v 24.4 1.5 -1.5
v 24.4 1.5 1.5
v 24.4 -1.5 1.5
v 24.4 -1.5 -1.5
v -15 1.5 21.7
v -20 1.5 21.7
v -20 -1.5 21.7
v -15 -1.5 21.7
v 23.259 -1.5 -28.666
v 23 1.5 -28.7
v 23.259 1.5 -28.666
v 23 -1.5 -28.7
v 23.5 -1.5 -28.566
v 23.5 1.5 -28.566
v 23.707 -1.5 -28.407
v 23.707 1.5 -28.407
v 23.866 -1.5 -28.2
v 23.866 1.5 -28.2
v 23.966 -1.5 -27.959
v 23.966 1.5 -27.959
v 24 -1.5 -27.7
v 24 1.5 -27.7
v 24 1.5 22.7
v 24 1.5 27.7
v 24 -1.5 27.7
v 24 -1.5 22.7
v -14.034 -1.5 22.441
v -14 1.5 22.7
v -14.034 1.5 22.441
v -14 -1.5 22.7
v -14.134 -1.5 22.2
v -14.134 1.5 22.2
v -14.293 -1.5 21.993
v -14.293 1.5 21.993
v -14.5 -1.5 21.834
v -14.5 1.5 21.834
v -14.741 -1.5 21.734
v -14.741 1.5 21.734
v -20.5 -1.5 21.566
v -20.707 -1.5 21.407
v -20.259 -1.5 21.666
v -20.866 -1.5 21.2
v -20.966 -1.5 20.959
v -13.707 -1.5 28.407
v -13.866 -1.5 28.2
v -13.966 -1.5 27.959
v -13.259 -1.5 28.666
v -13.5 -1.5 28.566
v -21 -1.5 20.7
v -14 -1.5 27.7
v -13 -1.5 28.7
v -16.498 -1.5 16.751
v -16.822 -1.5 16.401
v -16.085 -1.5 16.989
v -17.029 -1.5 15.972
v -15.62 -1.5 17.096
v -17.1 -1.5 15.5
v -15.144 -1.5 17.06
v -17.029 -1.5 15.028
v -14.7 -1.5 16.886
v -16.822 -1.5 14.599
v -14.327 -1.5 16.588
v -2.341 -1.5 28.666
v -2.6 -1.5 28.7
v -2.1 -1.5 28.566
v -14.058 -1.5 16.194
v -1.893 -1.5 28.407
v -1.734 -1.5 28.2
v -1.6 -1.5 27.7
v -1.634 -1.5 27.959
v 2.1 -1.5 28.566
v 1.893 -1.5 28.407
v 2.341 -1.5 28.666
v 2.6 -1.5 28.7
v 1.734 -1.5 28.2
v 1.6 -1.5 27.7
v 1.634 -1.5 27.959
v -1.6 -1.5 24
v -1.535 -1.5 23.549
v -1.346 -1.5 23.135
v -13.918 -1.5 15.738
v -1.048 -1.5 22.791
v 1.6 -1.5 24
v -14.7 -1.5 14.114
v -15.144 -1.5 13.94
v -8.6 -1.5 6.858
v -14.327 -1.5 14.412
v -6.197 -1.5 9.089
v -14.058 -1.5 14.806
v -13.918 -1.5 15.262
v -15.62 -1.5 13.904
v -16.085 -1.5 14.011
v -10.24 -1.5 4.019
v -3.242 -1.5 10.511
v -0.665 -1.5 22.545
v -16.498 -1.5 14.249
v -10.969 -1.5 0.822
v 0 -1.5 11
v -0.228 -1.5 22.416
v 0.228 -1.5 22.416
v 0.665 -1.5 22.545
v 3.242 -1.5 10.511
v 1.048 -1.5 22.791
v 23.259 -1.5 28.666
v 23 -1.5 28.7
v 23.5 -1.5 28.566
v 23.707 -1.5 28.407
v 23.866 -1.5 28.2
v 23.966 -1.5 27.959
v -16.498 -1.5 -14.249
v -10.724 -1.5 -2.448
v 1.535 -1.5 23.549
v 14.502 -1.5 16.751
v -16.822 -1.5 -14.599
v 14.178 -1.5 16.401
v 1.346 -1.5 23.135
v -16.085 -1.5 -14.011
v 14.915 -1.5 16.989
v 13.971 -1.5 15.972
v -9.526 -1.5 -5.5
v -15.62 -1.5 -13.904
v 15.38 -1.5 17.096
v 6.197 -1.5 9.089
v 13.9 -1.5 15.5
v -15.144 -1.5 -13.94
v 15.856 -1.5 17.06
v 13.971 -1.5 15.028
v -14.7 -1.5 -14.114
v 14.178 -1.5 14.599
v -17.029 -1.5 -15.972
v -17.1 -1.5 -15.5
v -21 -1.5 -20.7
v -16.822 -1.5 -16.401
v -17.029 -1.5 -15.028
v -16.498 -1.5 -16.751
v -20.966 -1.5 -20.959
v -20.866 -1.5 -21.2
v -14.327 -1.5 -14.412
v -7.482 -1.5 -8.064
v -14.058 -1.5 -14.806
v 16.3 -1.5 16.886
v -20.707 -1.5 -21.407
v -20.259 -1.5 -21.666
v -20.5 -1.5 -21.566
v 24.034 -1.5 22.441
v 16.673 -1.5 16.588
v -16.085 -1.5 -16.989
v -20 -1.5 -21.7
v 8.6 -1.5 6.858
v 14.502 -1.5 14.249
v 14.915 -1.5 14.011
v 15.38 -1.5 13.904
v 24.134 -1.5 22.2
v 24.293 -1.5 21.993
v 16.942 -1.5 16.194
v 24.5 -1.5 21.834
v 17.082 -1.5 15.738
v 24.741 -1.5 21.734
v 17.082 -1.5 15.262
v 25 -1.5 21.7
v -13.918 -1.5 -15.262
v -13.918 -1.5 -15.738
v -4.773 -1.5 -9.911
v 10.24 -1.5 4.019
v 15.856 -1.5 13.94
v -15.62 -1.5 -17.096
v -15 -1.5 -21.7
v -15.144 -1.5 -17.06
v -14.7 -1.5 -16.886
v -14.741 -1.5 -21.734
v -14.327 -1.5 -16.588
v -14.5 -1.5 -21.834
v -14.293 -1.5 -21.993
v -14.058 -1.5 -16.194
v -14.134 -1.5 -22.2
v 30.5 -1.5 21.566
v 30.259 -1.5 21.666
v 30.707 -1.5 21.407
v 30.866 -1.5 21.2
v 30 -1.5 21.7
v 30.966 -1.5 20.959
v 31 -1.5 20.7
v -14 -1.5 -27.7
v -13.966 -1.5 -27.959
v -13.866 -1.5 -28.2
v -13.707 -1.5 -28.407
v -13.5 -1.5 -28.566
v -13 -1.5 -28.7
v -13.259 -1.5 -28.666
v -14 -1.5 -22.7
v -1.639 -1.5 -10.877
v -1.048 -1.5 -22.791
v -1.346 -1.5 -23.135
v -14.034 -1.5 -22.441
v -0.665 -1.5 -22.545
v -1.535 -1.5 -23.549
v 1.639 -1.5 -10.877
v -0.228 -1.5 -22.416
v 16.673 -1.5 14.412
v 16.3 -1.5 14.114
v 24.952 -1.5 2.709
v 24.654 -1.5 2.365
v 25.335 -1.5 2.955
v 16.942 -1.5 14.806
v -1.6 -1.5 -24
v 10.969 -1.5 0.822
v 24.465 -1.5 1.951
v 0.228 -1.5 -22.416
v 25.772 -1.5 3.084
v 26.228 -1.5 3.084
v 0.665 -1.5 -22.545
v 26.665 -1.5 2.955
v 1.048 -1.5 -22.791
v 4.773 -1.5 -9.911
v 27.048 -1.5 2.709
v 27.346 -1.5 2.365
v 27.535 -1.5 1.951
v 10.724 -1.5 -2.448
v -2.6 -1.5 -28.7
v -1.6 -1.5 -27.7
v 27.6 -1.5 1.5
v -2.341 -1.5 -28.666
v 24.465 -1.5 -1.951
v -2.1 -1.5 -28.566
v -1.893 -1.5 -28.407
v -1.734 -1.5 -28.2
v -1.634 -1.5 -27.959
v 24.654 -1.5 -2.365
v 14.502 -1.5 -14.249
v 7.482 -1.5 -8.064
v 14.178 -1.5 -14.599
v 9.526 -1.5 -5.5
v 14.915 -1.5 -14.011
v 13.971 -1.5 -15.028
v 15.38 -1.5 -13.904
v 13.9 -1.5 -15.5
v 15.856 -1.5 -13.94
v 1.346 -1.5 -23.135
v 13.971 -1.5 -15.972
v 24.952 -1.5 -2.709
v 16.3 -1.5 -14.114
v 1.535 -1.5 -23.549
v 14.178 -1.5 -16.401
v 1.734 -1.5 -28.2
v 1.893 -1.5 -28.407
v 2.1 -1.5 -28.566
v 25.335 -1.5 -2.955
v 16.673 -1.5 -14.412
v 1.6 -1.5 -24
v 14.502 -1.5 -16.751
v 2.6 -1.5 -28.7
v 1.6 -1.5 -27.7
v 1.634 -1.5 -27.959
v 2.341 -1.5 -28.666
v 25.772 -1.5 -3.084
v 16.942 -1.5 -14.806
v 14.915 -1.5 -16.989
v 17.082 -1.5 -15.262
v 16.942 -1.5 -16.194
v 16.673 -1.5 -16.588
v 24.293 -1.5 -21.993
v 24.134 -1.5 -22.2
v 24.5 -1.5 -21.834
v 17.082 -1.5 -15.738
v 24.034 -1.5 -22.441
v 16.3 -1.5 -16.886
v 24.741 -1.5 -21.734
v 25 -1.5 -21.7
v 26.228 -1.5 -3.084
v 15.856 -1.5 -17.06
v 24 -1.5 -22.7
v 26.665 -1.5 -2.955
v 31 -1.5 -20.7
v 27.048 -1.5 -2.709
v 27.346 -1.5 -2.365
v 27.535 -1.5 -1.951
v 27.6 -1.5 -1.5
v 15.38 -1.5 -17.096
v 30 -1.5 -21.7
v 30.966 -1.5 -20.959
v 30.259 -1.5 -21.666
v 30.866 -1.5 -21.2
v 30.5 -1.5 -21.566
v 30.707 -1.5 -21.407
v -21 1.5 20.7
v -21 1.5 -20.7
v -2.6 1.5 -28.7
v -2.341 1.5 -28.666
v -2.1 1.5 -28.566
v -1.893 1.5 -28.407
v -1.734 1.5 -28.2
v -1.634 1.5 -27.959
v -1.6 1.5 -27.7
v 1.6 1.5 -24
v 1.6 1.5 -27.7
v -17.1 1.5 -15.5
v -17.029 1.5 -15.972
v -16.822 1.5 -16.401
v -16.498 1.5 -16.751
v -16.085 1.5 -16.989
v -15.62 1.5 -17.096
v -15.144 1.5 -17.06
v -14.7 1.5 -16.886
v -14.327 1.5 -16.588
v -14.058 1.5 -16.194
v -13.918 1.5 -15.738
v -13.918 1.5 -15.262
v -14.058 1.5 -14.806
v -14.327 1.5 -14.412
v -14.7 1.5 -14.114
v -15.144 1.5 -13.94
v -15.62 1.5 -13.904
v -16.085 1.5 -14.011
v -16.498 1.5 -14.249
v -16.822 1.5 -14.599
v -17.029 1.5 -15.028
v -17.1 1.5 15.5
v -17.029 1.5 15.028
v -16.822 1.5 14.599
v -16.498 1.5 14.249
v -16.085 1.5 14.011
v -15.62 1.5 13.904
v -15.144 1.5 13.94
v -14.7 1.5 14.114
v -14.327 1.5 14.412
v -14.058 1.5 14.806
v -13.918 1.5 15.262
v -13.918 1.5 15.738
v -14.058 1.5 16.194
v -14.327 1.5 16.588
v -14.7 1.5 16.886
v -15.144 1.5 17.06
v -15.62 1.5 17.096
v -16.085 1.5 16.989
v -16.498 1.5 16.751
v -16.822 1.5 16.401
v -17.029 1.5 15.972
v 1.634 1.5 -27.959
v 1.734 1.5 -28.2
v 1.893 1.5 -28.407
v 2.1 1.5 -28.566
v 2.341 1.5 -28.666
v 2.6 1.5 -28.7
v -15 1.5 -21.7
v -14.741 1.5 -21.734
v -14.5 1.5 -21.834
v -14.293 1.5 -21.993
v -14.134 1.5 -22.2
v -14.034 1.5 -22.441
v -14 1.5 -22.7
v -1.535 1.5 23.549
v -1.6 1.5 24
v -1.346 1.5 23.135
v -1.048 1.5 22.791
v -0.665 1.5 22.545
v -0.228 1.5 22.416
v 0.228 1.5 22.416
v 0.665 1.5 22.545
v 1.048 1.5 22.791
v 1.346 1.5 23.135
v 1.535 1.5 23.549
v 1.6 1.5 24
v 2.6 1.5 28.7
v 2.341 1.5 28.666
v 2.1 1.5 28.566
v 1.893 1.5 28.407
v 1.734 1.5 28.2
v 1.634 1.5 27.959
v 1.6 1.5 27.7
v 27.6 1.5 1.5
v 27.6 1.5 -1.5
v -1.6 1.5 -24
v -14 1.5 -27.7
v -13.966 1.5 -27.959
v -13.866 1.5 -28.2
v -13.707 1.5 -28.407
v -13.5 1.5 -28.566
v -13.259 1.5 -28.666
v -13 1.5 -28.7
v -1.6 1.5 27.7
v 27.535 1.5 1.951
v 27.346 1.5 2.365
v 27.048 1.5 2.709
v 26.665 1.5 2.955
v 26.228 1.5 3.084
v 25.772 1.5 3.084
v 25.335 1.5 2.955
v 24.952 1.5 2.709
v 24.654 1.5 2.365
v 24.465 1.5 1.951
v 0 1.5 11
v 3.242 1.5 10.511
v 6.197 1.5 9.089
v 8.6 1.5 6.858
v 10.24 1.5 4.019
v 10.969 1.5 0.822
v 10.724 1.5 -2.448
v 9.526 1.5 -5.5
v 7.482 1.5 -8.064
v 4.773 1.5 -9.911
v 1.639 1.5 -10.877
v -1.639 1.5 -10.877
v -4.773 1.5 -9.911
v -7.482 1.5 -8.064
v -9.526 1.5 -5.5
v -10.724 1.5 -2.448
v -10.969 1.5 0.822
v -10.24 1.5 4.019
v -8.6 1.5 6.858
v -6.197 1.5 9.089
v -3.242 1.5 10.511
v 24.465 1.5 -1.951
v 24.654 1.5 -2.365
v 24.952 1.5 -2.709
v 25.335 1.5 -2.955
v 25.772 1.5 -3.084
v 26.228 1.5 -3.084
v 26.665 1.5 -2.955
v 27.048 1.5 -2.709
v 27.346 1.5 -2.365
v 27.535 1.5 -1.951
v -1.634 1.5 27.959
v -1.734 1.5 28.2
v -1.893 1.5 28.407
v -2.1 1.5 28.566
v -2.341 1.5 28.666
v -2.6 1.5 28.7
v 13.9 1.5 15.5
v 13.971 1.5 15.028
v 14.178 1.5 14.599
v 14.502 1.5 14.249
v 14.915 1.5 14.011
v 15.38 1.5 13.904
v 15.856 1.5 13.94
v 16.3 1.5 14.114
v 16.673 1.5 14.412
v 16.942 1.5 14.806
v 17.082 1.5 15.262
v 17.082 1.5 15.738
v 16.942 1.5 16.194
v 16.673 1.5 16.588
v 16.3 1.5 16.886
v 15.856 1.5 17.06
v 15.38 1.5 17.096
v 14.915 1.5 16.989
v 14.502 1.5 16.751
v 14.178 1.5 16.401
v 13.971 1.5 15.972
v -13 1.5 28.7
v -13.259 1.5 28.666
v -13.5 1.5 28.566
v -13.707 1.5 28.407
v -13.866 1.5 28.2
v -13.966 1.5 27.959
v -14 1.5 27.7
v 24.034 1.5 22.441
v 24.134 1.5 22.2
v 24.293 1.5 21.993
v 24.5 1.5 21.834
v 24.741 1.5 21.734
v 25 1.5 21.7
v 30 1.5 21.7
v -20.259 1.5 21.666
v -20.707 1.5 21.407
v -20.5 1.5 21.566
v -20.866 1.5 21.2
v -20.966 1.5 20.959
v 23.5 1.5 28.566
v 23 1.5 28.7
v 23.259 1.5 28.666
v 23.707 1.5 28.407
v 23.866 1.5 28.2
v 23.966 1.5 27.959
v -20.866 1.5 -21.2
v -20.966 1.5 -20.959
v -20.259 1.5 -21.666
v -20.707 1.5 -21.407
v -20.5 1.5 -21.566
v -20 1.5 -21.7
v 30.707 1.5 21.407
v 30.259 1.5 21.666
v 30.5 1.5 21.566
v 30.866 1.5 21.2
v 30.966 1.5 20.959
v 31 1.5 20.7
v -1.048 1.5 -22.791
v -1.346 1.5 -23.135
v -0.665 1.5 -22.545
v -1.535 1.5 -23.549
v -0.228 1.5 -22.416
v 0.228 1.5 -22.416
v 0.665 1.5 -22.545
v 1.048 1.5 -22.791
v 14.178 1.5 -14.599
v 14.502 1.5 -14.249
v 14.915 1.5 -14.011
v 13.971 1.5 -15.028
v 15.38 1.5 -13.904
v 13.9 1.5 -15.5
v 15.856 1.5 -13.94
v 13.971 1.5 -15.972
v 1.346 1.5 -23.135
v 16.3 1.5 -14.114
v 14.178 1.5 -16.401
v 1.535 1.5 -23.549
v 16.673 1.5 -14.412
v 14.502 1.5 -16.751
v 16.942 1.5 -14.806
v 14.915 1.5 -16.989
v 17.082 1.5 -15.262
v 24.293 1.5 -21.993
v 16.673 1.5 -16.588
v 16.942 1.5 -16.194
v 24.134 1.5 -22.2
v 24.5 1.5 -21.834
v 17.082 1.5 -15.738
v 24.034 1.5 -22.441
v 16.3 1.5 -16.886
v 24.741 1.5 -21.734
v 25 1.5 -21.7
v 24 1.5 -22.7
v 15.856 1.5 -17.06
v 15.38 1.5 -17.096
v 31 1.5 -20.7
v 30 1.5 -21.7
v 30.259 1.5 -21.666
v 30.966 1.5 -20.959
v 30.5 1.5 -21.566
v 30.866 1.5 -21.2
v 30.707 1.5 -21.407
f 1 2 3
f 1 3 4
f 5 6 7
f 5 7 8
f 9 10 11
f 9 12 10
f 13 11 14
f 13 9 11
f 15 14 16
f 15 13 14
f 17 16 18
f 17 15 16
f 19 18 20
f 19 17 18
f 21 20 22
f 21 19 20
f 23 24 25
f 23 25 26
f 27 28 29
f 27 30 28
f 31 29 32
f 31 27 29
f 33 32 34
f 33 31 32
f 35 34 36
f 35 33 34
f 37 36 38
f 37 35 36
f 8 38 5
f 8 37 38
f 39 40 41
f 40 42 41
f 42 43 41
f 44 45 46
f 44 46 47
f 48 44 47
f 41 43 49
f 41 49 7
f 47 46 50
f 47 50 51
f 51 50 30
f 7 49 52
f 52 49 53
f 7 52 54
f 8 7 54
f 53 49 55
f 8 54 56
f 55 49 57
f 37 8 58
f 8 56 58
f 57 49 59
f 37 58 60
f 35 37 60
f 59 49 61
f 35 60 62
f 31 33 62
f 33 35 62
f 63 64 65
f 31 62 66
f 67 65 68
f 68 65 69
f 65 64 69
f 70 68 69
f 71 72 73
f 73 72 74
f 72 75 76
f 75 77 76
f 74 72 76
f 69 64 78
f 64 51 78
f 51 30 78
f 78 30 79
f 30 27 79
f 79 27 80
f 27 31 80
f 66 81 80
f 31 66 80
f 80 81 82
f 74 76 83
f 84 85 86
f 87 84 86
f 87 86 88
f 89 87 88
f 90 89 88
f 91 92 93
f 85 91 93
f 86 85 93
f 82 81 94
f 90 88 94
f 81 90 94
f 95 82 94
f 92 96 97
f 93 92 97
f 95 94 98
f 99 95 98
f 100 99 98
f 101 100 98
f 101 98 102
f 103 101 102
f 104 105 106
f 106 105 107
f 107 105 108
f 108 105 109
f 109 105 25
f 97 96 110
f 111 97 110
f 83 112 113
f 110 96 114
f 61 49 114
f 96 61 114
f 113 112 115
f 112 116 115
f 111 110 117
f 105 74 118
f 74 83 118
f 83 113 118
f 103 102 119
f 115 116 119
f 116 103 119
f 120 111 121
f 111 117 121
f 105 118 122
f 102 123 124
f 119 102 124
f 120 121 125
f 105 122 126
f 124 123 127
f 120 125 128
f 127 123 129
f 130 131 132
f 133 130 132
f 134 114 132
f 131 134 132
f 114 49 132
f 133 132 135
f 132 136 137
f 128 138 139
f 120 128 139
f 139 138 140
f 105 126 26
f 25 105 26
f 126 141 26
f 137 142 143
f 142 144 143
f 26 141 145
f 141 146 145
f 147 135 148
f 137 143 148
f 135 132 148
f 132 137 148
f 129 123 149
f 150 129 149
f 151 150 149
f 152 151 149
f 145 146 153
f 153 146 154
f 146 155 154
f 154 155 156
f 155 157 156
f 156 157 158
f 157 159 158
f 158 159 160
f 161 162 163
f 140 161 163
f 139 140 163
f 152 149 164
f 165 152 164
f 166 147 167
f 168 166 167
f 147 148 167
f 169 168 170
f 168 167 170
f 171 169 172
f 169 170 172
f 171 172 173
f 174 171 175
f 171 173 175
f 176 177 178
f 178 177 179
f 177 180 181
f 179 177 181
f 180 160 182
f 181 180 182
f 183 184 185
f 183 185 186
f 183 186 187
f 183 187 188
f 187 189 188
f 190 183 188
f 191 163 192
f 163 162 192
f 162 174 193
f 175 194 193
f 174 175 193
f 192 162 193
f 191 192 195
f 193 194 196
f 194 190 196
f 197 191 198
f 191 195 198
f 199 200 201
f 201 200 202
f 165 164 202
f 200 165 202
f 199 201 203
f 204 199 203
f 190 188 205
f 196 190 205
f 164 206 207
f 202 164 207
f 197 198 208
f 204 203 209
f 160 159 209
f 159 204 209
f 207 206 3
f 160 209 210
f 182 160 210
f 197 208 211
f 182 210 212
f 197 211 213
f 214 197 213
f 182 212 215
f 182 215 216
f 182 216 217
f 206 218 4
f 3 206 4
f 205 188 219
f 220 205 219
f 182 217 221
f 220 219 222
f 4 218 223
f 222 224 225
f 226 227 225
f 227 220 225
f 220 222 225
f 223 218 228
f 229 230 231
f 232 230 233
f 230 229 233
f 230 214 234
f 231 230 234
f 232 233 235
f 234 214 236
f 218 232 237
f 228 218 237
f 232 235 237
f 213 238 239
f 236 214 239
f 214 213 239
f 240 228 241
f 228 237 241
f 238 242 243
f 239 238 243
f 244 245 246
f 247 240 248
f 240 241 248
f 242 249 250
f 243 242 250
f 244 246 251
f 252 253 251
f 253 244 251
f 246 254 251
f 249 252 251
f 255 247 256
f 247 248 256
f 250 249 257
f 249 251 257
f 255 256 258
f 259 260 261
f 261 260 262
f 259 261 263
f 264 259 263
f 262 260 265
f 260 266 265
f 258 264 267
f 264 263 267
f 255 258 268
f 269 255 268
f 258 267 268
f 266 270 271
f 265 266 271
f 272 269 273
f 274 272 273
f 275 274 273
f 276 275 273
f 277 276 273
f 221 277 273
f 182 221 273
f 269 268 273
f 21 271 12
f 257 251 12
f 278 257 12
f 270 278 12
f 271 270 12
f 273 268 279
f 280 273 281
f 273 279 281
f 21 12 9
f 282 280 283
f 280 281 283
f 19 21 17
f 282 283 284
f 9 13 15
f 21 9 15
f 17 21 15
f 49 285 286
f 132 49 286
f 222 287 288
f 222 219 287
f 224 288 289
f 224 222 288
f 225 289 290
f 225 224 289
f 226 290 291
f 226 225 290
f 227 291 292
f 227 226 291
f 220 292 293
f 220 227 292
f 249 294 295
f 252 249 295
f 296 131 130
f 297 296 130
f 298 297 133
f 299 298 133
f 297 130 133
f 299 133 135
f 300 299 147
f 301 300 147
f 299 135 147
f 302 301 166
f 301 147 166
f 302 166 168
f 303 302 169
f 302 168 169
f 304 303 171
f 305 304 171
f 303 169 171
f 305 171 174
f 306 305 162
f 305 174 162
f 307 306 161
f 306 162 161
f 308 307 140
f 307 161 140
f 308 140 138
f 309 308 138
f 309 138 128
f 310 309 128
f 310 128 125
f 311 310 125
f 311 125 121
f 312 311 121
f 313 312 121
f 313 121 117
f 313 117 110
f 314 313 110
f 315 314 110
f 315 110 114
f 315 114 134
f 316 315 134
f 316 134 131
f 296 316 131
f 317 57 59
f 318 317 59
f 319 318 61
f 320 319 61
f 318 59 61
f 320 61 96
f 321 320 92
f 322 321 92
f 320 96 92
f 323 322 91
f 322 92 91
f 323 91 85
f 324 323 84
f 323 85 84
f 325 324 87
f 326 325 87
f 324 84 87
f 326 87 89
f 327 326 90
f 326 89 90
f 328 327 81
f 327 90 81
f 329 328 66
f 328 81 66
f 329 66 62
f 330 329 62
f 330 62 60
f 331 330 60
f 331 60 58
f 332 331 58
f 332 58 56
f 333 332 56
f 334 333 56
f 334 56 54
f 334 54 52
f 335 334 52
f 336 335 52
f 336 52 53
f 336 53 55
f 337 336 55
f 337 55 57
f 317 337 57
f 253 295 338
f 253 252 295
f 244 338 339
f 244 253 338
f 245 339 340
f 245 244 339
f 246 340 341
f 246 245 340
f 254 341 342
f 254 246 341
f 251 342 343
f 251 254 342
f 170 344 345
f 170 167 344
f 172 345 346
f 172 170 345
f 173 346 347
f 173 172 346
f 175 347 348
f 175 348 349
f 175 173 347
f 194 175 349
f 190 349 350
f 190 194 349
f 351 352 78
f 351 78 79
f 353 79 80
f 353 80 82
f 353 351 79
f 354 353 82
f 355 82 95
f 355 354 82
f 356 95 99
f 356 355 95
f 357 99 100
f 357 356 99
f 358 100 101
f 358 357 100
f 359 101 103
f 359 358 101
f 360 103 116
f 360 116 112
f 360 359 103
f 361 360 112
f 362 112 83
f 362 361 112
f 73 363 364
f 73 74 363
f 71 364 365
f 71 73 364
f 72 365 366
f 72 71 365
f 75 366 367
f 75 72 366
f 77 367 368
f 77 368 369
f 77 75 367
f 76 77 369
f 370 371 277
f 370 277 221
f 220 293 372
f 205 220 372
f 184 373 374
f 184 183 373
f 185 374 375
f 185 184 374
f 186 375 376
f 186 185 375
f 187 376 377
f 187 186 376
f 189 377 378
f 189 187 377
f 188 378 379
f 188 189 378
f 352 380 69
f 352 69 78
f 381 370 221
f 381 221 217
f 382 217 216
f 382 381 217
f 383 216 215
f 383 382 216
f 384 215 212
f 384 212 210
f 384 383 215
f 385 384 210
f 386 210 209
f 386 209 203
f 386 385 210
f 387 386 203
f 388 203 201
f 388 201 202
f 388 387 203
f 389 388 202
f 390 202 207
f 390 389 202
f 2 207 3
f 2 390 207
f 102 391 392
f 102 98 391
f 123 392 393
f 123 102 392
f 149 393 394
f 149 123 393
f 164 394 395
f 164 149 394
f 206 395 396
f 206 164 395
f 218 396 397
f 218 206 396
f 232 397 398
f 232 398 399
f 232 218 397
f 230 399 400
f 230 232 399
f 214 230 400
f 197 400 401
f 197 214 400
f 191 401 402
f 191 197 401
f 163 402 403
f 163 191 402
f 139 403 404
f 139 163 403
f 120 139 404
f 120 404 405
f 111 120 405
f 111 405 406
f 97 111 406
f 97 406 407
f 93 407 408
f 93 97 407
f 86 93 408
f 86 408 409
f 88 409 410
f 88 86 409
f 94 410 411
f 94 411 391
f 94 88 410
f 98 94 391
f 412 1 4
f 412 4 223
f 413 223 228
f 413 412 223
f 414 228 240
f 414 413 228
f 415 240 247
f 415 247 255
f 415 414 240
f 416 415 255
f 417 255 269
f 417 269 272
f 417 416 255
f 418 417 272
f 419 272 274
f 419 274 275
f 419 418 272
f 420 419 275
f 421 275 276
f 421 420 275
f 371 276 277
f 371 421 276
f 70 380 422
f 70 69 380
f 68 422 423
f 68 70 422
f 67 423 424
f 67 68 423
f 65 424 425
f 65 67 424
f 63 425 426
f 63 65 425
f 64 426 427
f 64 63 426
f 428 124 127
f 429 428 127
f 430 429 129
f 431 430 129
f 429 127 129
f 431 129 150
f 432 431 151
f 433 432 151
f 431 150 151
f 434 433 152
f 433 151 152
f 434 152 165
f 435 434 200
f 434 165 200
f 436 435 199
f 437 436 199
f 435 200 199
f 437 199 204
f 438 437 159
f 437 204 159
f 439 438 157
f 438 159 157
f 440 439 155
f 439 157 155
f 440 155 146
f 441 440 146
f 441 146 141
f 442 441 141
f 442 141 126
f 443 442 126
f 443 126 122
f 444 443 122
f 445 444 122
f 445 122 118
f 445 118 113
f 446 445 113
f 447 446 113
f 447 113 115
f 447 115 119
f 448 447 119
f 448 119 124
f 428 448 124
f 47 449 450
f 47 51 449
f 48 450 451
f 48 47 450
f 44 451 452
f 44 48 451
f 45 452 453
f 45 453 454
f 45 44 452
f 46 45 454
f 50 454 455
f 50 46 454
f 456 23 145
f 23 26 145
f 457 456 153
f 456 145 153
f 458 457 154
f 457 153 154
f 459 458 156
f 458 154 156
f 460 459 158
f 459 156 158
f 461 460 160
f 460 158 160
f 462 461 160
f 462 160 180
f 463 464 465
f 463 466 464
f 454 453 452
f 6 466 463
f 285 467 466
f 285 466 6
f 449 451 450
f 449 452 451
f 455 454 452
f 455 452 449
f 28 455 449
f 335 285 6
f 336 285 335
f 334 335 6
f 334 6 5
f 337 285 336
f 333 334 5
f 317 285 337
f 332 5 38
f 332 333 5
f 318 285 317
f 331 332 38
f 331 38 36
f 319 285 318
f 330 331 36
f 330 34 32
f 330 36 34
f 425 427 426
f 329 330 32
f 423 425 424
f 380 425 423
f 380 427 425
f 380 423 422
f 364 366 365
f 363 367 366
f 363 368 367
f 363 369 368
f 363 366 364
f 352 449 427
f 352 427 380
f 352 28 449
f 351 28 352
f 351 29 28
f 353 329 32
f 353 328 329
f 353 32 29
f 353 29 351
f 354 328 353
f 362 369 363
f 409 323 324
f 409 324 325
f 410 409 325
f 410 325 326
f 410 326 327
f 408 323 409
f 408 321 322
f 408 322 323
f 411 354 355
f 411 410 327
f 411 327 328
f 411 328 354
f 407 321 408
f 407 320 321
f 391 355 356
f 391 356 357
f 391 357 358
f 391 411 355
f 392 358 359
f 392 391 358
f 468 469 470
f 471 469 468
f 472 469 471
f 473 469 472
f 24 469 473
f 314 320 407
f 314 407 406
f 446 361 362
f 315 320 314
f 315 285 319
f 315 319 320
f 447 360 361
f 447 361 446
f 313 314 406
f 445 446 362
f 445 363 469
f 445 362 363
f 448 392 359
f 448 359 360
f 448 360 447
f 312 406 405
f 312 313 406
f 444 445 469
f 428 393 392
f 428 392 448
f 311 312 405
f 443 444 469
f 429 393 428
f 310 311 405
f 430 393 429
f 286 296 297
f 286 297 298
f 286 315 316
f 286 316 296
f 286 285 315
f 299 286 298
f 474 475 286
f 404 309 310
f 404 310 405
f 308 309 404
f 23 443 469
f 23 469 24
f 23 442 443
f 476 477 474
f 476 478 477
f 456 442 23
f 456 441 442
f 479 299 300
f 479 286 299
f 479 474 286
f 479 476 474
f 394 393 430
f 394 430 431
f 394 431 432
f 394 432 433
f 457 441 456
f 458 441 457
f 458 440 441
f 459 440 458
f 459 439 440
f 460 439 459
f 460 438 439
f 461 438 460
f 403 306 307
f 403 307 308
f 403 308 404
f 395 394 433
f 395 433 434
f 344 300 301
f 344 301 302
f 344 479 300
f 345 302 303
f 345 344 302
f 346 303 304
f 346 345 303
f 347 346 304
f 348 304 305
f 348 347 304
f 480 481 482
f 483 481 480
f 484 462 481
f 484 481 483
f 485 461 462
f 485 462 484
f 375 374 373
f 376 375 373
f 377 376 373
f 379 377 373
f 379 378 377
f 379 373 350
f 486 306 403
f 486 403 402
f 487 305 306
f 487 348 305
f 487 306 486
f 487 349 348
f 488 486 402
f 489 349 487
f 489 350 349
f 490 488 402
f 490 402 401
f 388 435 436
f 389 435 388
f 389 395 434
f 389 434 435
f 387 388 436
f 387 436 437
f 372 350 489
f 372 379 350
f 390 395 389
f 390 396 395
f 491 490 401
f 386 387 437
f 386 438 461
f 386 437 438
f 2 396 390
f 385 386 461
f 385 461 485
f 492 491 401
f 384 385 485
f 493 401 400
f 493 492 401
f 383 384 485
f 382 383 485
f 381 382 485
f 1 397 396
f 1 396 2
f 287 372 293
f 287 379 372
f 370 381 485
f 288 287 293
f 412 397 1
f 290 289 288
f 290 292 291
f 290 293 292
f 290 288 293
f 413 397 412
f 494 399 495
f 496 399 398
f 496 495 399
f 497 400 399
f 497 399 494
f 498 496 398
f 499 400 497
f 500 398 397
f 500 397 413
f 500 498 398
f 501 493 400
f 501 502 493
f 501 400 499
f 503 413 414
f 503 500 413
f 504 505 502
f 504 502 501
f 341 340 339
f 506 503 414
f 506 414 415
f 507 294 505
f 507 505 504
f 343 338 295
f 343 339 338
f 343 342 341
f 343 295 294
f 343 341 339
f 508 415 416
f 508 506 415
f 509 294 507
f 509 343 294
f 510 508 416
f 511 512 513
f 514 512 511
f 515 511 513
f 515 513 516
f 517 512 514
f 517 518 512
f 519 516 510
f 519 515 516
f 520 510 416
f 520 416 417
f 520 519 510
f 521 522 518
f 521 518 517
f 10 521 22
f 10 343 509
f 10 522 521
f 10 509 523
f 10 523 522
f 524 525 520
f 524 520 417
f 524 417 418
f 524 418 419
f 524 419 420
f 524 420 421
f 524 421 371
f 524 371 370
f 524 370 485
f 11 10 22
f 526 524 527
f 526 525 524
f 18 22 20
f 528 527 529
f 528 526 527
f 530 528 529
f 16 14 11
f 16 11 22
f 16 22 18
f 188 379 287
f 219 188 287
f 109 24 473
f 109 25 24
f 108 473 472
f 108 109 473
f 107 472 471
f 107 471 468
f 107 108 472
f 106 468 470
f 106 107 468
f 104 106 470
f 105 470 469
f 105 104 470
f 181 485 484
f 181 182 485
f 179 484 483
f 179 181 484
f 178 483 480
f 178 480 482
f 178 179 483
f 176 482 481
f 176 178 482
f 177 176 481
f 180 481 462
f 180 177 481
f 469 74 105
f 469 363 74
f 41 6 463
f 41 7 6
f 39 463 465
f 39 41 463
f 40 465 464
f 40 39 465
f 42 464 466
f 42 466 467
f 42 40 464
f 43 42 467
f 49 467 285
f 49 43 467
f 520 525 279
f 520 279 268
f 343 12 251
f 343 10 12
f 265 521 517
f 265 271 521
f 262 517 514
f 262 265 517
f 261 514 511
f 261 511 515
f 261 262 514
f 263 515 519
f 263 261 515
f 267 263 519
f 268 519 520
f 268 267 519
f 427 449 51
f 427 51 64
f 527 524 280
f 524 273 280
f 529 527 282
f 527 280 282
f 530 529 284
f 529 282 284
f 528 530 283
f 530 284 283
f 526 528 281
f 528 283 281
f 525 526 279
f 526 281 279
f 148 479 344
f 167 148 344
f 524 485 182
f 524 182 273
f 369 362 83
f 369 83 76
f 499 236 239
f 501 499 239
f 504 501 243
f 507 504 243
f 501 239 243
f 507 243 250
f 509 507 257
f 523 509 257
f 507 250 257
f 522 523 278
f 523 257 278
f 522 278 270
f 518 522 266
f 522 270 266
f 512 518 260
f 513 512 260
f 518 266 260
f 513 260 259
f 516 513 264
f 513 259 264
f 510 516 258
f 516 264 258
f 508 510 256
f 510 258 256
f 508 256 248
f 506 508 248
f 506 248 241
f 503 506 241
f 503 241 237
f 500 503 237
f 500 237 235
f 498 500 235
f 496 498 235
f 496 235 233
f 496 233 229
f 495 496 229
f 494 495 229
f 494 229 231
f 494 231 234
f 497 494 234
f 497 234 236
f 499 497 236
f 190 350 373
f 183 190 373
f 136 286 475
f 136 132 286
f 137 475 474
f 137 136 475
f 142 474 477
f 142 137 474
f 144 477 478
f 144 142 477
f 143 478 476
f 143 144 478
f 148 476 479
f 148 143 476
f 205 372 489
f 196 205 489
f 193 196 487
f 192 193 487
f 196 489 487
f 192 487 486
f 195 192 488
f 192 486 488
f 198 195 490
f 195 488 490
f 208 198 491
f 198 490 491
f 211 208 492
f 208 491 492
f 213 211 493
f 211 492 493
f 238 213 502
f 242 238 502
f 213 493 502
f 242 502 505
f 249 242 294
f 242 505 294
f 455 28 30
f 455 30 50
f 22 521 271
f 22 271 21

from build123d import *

# Parameters (mm, degrees)
SKETCH1_W            = 42
SKETCH1_H            = 42
SKETCH1_R            = 11
BOSS_EXTRUDE1_DEPTH  = 1.5
M3_CLEARANCE_HOLE1_D = 3.2
SKETCH4_W            = 10
SKETCH4_H            = 28
BOSS_EXTRUDE2_DEPTH  = 3
SKETCH5_W            = 7
SKETCH5_H            = 0.7
BOSS_EXTRUDE3_DEPTH  = 3
FILLET1_R            = 1


with BuildPart() as part:
    # Sketch1 → Boss-Extrude1 (new, symmetric)
    with BuildSketch(Plane(origin=(0, 0, 0), x_dir=(1, 0, 0), z_dir=(0, 1, 0))):
        Rectangle(SKETCH1_W, SKETCH1_H)
        with Locations(Location((0, 0, 0), (0, 0, 270))):
            Circle(SKETCH1_R, mode=Mode.SUBTRACT)
    extrude(amount=BOSS_EXTRUDE1_DEPTH, both=True)

    # M3 Clearance Hole1 (through all)
    with Locations(Plane(origin=(0, 1.5, 0), x_dir=(1, 0, 0), z_dir=(0, 1, 0))):
        with Locations((-15.5, 15.5), (15.5, 15.5), (15.5, -15.5), (-15.5, -15.5)):
            Hole(M3_CLEARANCE_HOLE1_D / 2)

    # Sketch4 → Boss-Extrude2 (add)
    # profile 1 of 3: a face of its own
    with BuildSketch(Plane(origin=(0, 1.5, 0), x_dir=(1, 0, 0), z_dir=(0, 1, 0))):
        with BuildLine():
            Line((1.6, -24), (1.6, -28.7))
            Line((1.6, -28.7), (14, -28.7))
            Line((14, -28.7), (14, -21))
            Line((14, -21), (-14, -21))
            Line((-14, -21), (-14, -28.7))
            Line((-14, -28.7), (-1.6, -28.7))
            Line((-1.6, -28.7), (-1.6, -24))
            ThreePointArc((-1.6, -24), (0, -22.4), (1.6, -24))
        make_face()
    # profile 2 of 3: a face of its own
    with BuildSketch(Plane(origin=(0, 1.5, 0), x_dir=(1, 0, 0), z_dir=(0, 1, 0))):
        with BuildLine():
            Line((1.6, 28.7), (14, 28.7))
            Line((14, 28.7), (14, 21))
            Line((14, 21), (-14, 21))
            Line((-14, 21), (-14, 28.7))
            Line((-14, 28.7), (-1.6, 28.7))
            Line((-1.6, 28.7), (-1.6, 24))
            ThreePointArc((-1.6, 24), (0, 22.4), (1.6, 24))
            Line((1.6, 24), (1.6, 28.7))
        make_face()
    # profile 3 of 3: a face of its own
    with BuildSketch(Plane(origin=(0, 1.5, 0), x_dir=(1, 0, 0), z_dir=(0, 1, 0))):
        with Locations((26, 0)):
            Rectangle(SKETCH4_W, SKETCH4_H)
        with BuildLine():
            Line((27.6, 1.5), (27.6, -1.5))
            ThreePointArc((27.6, -1.5), (26, -3.1), (24.4, -1.5))
            Line((24.4, -1.5), (24.4, 1.5))
            ThreePointArc((24.4, 1.5), (26, 3.1), (27.6, 1.5))
        make_face(mode=Mode.SUBTRACT)
    extrude(amount=-BOSS_EXTRUDE2_DEPTH)

    # Sketch5 → Boss-Extrude3 (add)
    with BuildSketch(Plane(origin=(0, 1.5, 0), x_dir=(1, 0, 0), z_dir=(0, 1, 0))):
        Polygon((21, 14), (31, 14), (31, 21.7), (24, 21.7), (24, 28.7), (14, 28.7), (14, 21), (21, 21), align=None)
        Polygon((31, -14), (21, -14), (21, -21), (14, -21), (14, -28.7), (24, -28.7), (24, -21.7), (31, -21.7), align=None)
        with Locations((-17.5, -21.35)):
            Rectangle(SKETCH5_W, SKETCH5_H)
        with Locations((-17.5, 21.35)):
            Rectangle(SKETCH5_W, SKETCH5_H)
    extrude(amount=-BOSS_EXTRUDE3_DEPTH)

    # Fillet1
    fillet1_edges = [part.edges().sort_by_distance(p)[0] for p in [
        (-21, 0, 21.7),
        (31, 0, -21.7),
        (-21, 0, -21.7),
        (-14, 0, -21.7),
        (24, 0, -28.7),
        (24, 0, -21.7),
        (31, 0, 21.7),
        (24, 0, 21.7),
        (24, 0, 28.7),
        (-14, 0, 21.7),
        (-1.6, 0, 28.7),
        (-14, 0, 28.7),
        (1.6, 0, 28.7),
        (1.6, 0, -28.7),
        (-14, 0, -28.7),
        (-1.6, 0, -28.7),
    ]]
    fillet(fillet1_edges, radius=FILLET1_R)


solid = part.part
